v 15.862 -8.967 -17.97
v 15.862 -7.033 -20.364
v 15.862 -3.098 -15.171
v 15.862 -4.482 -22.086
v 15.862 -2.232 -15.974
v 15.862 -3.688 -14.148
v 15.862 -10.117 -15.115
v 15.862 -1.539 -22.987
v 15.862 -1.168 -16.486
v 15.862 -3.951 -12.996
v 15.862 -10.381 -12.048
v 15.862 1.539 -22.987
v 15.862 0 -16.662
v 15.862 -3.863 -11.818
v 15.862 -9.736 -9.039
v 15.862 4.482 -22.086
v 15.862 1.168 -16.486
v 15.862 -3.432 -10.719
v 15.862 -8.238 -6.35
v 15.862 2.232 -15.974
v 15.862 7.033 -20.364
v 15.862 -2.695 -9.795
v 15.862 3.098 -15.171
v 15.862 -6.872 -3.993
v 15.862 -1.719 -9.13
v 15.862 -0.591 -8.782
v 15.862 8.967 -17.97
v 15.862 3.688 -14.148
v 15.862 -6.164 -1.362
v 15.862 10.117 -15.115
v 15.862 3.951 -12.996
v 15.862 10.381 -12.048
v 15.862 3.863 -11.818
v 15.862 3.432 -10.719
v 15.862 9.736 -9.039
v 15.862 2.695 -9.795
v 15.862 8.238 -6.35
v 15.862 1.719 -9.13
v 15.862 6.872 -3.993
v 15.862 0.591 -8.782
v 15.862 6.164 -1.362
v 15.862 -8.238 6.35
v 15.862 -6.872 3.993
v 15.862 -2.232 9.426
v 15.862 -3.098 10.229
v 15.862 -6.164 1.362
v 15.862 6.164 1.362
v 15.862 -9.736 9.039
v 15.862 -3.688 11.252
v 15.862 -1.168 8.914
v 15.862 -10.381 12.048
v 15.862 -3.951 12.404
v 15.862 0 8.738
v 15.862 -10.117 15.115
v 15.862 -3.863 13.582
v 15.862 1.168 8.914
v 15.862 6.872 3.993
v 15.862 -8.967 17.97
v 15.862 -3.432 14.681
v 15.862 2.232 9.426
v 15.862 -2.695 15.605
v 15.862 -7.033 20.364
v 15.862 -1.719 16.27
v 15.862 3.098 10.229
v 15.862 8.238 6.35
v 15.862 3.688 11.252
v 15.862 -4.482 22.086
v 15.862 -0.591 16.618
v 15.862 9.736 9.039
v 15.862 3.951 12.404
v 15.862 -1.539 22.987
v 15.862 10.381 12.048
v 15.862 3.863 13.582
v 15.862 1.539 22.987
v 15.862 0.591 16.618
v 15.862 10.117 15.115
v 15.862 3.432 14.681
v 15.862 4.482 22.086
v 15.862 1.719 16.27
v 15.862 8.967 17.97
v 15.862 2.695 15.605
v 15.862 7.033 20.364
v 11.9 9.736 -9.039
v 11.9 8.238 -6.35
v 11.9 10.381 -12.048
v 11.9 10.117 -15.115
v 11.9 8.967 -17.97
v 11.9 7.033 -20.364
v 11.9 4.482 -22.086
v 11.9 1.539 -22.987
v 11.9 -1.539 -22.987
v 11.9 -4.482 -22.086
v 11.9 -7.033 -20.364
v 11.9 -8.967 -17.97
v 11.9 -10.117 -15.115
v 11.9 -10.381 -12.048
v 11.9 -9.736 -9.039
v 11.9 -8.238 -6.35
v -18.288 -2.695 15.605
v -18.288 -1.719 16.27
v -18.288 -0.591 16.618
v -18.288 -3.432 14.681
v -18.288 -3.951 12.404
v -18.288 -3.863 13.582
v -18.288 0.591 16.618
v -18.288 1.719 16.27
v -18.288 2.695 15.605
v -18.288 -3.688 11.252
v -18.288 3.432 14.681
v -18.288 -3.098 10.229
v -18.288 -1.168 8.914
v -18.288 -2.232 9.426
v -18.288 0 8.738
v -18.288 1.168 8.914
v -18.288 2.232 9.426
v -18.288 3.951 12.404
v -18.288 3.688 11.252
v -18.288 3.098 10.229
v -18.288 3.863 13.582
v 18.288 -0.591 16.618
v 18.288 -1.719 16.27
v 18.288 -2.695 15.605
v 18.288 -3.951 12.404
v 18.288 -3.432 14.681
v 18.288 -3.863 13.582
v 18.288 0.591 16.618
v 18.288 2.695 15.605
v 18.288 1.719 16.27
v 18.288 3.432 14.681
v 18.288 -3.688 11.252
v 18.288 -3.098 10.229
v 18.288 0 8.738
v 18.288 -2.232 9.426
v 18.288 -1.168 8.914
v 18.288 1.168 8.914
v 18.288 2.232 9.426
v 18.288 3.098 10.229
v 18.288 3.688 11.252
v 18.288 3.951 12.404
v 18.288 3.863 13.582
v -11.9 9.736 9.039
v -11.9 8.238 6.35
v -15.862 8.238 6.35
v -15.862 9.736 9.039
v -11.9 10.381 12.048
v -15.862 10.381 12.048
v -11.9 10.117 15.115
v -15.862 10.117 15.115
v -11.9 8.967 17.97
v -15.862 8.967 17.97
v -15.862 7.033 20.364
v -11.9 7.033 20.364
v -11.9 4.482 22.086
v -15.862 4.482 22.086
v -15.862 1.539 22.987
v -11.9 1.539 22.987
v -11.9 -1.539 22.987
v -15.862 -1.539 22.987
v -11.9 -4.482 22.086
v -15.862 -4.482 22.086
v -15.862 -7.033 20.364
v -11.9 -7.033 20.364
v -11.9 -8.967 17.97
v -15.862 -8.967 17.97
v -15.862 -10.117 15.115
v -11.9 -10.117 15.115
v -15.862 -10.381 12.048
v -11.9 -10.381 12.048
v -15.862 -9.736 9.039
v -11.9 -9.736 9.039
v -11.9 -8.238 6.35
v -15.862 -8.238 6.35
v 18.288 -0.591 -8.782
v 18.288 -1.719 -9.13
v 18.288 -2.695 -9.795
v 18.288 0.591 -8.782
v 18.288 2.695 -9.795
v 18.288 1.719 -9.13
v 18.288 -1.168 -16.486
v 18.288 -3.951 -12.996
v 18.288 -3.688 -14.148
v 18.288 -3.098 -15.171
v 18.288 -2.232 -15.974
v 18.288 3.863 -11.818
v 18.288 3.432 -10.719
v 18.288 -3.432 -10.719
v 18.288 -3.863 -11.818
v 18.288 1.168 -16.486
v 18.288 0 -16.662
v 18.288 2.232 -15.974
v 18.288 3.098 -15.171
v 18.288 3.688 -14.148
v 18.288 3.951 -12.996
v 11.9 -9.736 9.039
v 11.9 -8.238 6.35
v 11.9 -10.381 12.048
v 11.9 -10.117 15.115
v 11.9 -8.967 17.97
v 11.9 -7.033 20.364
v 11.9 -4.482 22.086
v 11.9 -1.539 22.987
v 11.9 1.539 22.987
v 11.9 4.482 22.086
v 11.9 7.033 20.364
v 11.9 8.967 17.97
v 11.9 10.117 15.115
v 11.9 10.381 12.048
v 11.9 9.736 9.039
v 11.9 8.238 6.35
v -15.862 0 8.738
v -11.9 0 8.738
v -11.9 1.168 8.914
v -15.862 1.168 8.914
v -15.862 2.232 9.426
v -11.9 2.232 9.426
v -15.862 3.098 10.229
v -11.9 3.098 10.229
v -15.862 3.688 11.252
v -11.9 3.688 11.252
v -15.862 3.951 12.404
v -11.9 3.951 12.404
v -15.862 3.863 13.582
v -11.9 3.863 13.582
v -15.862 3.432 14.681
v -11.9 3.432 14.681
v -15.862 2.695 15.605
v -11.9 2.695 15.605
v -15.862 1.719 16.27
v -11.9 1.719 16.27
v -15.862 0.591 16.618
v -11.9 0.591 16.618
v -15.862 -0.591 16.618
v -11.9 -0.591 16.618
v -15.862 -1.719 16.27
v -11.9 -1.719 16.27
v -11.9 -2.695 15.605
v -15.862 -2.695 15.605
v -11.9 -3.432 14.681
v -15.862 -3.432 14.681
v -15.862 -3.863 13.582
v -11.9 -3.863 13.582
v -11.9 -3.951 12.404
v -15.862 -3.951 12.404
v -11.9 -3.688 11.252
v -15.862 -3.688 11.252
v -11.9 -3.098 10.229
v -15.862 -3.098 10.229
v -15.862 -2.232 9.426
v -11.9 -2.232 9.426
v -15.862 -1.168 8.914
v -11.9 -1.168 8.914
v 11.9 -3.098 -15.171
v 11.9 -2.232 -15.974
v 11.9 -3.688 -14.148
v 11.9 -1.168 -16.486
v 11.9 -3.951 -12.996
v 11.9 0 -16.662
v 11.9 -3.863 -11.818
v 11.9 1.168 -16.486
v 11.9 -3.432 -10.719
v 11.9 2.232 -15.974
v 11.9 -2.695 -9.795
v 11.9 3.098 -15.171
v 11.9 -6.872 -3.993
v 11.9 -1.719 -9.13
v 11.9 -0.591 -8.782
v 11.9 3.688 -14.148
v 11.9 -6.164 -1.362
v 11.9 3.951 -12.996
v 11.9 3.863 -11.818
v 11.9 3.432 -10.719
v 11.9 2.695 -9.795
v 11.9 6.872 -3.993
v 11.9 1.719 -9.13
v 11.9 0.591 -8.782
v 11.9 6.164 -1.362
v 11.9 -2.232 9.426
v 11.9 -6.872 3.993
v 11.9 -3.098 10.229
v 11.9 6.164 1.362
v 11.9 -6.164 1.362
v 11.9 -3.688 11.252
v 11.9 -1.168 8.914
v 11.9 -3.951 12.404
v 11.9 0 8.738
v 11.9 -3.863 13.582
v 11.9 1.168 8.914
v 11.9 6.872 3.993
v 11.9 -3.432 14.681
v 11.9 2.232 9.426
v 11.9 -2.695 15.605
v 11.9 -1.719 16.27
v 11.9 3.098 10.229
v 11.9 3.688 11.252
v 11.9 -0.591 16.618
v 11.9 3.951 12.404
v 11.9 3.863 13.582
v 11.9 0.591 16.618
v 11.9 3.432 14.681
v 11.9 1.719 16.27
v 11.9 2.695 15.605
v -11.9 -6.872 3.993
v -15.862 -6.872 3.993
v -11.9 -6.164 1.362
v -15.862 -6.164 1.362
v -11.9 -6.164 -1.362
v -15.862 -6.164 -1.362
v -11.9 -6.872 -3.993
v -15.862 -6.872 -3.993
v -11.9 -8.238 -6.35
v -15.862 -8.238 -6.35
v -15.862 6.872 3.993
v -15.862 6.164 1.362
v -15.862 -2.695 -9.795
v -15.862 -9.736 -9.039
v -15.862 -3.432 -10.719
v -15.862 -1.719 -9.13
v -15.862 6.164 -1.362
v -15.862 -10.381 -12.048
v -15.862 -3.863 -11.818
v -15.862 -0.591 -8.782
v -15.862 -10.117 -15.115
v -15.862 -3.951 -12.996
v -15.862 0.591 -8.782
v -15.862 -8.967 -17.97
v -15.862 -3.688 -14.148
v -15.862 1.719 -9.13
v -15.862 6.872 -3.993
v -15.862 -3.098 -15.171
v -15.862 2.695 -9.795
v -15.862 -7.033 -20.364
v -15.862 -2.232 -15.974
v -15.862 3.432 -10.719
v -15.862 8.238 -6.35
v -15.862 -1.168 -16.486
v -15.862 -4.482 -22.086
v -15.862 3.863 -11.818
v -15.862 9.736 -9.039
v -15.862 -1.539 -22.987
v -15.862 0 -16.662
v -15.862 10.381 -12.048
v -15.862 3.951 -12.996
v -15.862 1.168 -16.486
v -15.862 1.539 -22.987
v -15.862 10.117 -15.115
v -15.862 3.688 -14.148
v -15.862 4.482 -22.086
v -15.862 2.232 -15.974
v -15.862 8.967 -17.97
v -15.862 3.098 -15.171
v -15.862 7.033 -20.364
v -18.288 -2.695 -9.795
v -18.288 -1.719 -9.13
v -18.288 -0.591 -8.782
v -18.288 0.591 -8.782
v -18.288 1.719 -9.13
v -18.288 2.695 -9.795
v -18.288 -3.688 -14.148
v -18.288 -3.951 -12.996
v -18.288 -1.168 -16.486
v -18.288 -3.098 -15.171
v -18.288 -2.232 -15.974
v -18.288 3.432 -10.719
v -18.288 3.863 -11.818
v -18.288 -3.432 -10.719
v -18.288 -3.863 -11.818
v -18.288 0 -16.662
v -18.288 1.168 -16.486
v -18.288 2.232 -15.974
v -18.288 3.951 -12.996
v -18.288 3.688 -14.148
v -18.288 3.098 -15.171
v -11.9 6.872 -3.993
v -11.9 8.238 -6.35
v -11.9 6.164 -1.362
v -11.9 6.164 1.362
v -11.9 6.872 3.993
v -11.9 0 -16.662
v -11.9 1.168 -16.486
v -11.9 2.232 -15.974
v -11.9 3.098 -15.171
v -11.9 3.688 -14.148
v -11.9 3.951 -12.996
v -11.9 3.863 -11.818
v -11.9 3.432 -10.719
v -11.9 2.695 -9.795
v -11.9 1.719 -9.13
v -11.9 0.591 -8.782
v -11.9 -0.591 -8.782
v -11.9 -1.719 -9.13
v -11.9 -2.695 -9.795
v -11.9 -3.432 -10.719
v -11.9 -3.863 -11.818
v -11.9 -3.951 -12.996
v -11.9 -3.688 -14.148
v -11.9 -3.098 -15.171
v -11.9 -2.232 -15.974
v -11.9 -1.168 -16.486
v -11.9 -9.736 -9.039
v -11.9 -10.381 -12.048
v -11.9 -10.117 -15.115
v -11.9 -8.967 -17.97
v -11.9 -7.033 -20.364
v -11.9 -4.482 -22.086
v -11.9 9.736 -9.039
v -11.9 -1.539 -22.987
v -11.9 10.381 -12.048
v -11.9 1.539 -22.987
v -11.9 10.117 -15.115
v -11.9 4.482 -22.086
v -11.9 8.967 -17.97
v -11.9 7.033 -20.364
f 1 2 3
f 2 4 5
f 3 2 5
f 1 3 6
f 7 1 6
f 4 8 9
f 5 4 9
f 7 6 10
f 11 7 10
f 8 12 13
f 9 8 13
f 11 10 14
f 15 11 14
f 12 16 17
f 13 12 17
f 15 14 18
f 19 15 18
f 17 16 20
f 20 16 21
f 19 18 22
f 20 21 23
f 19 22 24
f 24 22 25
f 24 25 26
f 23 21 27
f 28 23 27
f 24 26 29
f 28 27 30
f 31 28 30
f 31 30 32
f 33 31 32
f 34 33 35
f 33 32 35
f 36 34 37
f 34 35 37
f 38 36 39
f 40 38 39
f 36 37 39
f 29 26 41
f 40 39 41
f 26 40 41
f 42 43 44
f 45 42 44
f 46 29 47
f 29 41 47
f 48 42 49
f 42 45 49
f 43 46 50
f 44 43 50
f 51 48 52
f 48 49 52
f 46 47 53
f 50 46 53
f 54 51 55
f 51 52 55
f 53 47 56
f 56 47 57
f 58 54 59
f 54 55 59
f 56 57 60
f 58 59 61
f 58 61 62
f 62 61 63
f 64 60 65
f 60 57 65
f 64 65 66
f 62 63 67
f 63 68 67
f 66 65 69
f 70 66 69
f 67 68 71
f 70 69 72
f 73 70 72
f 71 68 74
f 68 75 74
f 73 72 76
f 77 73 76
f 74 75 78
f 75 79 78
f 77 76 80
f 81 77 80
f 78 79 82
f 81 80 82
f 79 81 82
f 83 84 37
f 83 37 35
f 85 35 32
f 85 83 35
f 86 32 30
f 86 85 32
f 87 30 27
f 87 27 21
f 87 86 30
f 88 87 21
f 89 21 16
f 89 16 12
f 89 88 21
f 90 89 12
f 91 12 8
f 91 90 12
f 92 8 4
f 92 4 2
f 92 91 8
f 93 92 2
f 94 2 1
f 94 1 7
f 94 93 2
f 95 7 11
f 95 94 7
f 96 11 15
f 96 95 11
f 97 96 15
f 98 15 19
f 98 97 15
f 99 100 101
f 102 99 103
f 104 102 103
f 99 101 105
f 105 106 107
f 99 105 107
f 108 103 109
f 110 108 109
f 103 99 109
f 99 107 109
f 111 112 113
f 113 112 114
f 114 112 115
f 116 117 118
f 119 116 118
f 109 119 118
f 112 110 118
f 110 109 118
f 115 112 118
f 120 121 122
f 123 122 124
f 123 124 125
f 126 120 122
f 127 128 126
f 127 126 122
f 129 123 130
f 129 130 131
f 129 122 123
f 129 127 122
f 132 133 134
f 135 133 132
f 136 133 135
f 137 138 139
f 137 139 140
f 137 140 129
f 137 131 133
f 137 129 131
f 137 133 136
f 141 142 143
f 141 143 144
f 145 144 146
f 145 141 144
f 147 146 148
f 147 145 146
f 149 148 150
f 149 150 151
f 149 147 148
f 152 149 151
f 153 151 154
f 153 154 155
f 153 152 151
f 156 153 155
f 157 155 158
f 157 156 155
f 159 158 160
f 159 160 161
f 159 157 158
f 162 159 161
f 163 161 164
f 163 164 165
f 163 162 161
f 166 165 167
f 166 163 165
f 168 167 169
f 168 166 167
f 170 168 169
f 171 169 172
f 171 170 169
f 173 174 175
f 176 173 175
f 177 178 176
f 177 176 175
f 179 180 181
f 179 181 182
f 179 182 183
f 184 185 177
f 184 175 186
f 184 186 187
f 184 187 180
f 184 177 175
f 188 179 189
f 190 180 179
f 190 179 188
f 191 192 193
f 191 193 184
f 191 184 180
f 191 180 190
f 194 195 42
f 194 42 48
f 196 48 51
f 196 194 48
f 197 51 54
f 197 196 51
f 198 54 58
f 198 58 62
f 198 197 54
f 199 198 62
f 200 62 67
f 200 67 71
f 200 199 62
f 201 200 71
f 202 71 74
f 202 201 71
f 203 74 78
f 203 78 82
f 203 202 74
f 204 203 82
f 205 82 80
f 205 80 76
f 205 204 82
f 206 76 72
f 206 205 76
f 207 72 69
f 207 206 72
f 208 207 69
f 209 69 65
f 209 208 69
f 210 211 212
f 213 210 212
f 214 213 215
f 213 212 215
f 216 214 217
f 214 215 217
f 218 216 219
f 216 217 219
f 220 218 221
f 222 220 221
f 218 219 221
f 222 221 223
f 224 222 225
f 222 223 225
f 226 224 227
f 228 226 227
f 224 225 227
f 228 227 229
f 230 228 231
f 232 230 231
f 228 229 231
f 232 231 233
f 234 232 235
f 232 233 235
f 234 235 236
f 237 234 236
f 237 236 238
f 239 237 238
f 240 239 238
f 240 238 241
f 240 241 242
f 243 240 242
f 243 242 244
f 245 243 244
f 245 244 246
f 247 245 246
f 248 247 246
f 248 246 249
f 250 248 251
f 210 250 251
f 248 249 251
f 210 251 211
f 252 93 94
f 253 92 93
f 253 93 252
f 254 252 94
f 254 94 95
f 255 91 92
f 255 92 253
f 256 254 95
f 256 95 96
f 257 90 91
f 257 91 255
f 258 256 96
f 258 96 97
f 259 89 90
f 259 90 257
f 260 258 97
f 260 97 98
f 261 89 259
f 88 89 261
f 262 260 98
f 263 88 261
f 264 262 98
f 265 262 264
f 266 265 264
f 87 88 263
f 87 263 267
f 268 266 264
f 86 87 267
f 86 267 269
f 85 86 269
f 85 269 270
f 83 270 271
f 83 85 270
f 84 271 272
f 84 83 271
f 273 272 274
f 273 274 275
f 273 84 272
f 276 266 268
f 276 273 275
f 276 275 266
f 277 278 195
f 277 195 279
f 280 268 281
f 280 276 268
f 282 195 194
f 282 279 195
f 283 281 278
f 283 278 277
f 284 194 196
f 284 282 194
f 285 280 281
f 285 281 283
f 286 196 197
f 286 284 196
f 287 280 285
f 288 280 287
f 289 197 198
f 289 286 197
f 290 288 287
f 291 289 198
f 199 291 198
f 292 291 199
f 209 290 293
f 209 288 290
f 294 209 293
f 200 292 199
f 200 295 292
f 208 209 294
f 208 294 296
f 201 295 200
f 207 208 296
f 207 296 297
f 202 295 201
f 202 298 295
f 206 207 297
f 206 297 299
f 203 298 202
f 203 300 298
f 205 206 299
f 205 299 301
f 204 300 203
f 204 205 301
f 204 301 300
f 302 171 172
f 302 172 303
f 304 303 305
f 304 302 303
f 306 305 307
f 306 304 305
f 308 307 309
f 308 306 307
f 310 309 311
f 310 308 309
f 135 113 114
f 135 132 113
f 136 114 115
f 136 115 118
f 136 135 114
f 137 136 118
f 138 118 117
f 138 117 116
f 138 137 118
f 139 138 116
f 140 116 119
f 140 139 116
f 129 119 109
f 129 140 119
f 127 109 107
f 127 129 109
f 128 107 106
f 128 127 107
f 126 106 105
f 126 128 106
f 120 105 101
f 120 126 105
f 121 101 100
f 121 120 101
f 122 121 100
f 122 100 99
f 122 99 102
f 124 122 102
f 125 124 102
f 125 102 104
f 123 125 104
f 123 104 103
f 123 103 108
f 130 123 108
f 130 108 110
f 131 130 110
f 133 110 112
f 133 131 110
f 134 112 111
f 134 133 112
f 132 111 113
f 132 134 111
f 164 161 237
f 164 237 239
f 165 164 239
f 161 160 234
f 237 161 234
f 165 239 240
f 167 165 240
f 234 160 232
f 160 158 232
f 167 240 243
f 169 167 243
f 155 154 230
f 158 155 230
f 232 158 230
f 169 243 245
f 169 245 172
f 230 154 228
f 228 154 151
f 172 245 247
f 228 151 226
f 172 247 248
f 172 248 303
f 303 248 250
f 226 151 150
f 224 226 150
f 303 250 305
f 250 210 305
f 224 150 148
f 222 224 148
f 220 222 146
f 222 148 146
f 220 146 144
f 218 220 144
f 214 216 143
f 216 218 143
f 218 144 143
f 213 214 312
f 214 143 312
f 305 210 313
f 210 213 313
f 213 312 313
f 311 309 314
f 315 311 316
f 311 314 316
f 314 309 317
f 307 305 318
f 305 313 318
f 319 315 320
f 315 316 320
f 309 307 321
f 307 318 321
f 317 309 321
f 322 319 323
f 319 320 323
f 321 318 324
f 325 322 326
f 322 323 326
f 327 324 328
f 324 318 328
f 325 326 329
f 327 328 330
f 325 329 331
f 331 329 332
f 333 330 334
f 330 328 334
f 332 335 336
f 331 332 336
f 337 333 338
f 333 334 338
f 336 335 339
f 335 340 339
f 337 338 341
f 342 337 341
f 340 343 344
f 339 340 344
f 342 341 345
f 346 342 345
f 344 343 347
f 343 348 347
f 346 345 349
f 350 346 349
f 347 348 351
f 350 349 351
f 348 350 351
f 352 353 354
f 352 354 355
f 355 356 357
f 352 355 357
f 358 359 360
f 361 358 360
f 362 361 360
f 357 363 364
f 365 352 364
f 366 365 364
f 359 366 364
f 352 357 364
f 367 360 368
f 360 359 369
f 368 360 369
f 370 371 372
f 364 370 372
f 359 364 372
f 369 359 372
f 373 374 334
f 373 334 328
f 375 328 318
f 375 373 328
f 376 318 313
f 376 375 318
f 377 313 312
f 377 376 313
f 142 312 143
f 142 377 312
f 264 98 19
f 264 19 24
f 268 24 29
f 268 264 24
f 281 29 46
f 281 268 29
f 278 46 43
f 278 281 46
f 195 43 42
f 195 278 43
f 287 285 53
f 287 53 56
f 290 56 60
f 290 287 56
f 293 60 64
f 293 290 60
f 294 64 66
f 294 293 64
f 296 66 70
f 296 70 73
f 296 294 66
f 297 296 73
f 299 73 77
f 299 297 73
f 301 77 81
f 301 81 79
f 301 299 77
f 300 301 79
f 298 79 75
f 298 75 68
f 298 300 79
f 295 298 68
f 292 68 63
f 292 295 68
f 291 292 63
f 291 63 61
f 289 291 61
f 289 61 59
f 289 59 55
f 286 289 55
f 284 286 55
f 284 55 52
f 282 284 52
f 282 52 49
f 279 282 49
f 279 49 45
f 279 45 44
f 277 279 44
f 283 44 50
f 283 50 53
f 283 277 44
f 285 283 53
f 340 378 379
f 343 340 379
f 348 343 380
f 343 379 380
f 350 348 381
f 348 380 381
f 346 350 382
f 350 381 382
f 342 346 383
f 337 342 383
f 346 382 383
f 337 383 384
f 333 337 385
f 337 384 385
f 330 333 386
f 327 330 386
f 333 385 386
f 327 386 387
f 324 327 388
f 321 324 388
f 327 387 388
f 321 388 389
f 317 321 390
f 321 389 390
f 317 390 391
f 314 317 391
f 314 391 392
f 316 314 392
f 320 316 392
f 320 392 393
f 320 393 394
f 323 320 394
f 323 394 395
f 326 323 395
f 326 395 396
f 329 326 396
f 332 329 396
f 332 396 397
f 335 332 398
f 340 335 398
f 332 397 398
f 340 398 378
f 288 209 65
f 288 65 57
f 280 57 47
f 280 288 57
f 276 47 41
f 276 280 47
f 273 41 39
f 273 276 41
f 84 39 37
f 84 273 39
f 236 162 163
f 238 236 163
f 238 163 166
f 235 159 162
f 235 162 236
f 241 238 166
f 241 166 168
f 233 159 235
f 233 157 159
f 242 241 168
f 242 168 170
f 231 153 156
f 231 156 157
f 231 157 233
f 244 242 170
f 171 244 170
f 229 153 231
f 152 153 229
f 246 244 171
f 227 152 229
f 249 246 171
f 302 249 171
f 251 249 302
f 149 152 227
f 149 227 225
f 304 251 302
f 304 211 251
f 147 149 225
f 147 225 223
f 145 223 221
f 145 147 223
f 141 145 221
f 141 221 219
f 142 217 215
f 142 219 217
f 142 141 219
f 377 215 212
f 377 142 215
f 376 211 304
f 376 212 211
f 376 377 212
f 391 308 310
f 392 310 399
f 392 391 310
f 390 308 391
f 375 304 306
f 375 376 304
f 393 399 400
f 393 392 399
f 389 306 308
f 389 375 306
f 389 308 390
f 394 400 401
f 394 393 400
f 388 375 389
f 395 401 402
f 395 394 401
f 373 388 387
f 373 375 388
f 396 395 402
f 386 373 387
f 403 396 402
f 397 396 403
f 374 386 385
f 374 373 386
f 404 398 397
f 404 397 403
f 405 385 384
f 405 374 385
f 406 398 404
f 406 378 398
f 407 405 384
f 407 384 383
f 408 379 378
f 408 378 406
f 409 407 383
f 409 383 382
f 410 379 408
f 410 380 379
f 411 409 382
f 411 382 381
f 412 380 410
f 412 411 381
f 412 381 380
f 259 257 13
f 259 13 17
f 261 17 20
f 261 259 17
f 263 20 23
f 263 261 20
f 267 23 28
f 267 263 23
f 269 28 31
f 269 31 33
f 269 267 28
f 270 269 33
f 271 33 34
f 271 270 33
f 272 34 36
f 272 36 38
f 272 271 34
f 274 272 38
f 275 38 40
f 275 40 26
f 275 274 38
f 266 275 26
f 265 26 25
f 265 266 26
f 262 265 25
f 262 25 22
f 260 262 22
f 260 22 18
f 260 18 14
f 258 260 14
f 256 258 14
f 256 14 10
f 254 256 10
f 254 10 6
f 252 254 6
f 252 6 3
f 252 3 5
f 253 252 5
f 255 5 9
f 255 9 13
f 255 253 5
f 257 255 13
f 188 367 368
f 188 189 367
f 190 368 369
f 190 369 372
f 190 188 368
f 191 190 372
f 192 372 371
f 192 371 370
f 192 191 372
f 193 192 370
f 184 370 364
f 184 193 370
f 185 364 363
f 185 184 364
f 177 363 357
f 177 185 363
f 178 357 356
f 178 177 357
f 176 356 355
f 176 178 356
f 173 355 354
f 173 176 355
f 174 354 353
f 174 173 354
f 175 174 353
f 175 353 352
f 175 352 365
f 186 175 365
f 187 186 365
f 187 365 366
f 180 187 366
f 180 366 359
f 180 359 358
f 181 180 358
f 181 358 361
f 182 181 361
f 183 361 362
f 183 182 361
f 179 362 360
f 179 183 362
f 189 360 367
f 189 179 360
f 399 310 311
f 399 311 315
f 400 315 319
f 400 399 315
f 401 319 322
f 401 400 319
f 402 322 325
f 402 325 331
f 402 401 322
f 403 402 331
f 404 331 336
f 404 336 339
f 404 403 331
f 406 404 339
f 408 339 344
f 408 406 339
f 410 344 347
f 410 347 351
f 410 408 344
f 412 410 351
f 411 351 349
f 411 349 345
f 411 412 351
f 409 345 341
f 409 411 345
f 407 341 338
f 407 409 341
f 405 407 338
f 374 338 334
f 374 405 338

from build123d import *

# Parameters (mm, degrees)
BACK_LINK_SKETCH_R       = 3.9624
BACK_LINK_EXTRUDE_DEPTH  = 3.9624
FRONT_LINK_SKETCH_R      = 3.9624
FRONT_LINK_EXTRUDE_DEPTH = 3.9624
PIN_SKETCH_R             = 3.9624
PIN_EXTRUDE_DEPTH        = 18.288
PIN_EXTRUDE_DEPTH_BACK   = 18.288
PIN_EXTRUDE_2_DEPTH      = 18.288
PIN_EXTRUDE_2_DEPTH_BACK = 18.288


with BuildPart() as part:
    # Back Link Sketch → Back Link Extrude (new body)
    with BuildSketch(Plane(origin=(-11.8999, 0, 0), x_dir=(0, 0, -1), z_dir=(1, 0, 0))):
        with BuildLine():
            ThreePointArc((-6.35, 8.23799379), (-23.1013, 0), (-6.35, -8.23799379))
            ThreePointArc((-6.35, -8.23799379), (0, -6.074687581), (6.35, -8.23799379))
            ThreePointArc((6.35, -8.23799379), (23.1013, 0), (6.35, 8.23799379))
            ThreePointArc((6.35, 8.23799379), (0, 6.074687581), (-6.35, 8.23799379))
        make_face()
        with Locations((-12.7, 0)):
            Circle(BACK_LINK_SKETCH_R, mode=Mode.SUBTRACT)
        with Locations((12.7, 0)):
            Circle(BACK_LINK_SKETCH_R, mode=Mode.SUBTRACT)
    extrude(amount=-BACK_LINK_EXTRUDE_DEPTH)


with BuildPart() as body_2:
    # Front Link Sketch → Front Link Extrude (new body)
    with BuildSketch(Plane(origin=(11.8999, 0, 0), x_dir=(0, 0, -1), z_dir=(1, 0, 0))):
        with BuildLine():
            ThreePointArc((-6.35, 8.23799379), (0, 6.074687581), (6.35, 8.23799379))
            ThreePointArc((6.35, 8.23799379), (23.1013, 0), (6.35, -8.23799379))
            ThreePointArc((6.35, -8.23799379), (0, -6.074687581), (-6.35, -8.23799379))
            ThreePointArc((-6.35, -8.23799379), (-23.1013, 0), (-6.35, 8.23799379))
        make_face()
        with Locations((-12.7, 0)):
            Circle(FRONT_LINK_SKETCH_R, mode=Mode.SUBTRACT)
        with Locations((12.7, 0)):
            Circle(FRONT_LINK_SKETCH_R, mode=Mode.SUBTRACT)
    extrude(amount=FRONT_LINK_EXTRUDE_DEPTH)


with BuildPart() as body_3:
    # Pin Sketch → Pin Extrude (new body, two sides)
    with BuildSketch(Plane(origin=(0, 0, 0), x_dir=(0, 0, -1), z_dir=(1, 0, 0))) as pin_extrude_sk:
        with Locations((12.7, 0)):
            Circle(PIN_SKETCH_R)
    extrude(amount=PIN_EXTRUDE_DEPTH)
    extrude(pin_extrude_sk.sketch, amount=-PIN_EXTRUDE_DEPTH_BACK)


with BuildPart() as body_4:
    # Pin Sketch → Pin Extrude 2 (new body, two sides)
    with BuildSketch(Plane(origin=(0, 0, 0), x_dir=(0, 0, -1), z_dir=(1, 0, 0))) as pin_extrude_2_sk:
        with Locations((-12.7, 0)):
            Circle(PIN_SKETCH_R)
    extrude(amount=PIN_EXTRUDE_2_DEPTH)
    extrude(pin_extrude_2_sk.sketch, amount=-PIN_EXTRUDE_2_DEPTH_BACK)


solid = Compound([part.part, body_2.part, body_3.part, body_4.part])
